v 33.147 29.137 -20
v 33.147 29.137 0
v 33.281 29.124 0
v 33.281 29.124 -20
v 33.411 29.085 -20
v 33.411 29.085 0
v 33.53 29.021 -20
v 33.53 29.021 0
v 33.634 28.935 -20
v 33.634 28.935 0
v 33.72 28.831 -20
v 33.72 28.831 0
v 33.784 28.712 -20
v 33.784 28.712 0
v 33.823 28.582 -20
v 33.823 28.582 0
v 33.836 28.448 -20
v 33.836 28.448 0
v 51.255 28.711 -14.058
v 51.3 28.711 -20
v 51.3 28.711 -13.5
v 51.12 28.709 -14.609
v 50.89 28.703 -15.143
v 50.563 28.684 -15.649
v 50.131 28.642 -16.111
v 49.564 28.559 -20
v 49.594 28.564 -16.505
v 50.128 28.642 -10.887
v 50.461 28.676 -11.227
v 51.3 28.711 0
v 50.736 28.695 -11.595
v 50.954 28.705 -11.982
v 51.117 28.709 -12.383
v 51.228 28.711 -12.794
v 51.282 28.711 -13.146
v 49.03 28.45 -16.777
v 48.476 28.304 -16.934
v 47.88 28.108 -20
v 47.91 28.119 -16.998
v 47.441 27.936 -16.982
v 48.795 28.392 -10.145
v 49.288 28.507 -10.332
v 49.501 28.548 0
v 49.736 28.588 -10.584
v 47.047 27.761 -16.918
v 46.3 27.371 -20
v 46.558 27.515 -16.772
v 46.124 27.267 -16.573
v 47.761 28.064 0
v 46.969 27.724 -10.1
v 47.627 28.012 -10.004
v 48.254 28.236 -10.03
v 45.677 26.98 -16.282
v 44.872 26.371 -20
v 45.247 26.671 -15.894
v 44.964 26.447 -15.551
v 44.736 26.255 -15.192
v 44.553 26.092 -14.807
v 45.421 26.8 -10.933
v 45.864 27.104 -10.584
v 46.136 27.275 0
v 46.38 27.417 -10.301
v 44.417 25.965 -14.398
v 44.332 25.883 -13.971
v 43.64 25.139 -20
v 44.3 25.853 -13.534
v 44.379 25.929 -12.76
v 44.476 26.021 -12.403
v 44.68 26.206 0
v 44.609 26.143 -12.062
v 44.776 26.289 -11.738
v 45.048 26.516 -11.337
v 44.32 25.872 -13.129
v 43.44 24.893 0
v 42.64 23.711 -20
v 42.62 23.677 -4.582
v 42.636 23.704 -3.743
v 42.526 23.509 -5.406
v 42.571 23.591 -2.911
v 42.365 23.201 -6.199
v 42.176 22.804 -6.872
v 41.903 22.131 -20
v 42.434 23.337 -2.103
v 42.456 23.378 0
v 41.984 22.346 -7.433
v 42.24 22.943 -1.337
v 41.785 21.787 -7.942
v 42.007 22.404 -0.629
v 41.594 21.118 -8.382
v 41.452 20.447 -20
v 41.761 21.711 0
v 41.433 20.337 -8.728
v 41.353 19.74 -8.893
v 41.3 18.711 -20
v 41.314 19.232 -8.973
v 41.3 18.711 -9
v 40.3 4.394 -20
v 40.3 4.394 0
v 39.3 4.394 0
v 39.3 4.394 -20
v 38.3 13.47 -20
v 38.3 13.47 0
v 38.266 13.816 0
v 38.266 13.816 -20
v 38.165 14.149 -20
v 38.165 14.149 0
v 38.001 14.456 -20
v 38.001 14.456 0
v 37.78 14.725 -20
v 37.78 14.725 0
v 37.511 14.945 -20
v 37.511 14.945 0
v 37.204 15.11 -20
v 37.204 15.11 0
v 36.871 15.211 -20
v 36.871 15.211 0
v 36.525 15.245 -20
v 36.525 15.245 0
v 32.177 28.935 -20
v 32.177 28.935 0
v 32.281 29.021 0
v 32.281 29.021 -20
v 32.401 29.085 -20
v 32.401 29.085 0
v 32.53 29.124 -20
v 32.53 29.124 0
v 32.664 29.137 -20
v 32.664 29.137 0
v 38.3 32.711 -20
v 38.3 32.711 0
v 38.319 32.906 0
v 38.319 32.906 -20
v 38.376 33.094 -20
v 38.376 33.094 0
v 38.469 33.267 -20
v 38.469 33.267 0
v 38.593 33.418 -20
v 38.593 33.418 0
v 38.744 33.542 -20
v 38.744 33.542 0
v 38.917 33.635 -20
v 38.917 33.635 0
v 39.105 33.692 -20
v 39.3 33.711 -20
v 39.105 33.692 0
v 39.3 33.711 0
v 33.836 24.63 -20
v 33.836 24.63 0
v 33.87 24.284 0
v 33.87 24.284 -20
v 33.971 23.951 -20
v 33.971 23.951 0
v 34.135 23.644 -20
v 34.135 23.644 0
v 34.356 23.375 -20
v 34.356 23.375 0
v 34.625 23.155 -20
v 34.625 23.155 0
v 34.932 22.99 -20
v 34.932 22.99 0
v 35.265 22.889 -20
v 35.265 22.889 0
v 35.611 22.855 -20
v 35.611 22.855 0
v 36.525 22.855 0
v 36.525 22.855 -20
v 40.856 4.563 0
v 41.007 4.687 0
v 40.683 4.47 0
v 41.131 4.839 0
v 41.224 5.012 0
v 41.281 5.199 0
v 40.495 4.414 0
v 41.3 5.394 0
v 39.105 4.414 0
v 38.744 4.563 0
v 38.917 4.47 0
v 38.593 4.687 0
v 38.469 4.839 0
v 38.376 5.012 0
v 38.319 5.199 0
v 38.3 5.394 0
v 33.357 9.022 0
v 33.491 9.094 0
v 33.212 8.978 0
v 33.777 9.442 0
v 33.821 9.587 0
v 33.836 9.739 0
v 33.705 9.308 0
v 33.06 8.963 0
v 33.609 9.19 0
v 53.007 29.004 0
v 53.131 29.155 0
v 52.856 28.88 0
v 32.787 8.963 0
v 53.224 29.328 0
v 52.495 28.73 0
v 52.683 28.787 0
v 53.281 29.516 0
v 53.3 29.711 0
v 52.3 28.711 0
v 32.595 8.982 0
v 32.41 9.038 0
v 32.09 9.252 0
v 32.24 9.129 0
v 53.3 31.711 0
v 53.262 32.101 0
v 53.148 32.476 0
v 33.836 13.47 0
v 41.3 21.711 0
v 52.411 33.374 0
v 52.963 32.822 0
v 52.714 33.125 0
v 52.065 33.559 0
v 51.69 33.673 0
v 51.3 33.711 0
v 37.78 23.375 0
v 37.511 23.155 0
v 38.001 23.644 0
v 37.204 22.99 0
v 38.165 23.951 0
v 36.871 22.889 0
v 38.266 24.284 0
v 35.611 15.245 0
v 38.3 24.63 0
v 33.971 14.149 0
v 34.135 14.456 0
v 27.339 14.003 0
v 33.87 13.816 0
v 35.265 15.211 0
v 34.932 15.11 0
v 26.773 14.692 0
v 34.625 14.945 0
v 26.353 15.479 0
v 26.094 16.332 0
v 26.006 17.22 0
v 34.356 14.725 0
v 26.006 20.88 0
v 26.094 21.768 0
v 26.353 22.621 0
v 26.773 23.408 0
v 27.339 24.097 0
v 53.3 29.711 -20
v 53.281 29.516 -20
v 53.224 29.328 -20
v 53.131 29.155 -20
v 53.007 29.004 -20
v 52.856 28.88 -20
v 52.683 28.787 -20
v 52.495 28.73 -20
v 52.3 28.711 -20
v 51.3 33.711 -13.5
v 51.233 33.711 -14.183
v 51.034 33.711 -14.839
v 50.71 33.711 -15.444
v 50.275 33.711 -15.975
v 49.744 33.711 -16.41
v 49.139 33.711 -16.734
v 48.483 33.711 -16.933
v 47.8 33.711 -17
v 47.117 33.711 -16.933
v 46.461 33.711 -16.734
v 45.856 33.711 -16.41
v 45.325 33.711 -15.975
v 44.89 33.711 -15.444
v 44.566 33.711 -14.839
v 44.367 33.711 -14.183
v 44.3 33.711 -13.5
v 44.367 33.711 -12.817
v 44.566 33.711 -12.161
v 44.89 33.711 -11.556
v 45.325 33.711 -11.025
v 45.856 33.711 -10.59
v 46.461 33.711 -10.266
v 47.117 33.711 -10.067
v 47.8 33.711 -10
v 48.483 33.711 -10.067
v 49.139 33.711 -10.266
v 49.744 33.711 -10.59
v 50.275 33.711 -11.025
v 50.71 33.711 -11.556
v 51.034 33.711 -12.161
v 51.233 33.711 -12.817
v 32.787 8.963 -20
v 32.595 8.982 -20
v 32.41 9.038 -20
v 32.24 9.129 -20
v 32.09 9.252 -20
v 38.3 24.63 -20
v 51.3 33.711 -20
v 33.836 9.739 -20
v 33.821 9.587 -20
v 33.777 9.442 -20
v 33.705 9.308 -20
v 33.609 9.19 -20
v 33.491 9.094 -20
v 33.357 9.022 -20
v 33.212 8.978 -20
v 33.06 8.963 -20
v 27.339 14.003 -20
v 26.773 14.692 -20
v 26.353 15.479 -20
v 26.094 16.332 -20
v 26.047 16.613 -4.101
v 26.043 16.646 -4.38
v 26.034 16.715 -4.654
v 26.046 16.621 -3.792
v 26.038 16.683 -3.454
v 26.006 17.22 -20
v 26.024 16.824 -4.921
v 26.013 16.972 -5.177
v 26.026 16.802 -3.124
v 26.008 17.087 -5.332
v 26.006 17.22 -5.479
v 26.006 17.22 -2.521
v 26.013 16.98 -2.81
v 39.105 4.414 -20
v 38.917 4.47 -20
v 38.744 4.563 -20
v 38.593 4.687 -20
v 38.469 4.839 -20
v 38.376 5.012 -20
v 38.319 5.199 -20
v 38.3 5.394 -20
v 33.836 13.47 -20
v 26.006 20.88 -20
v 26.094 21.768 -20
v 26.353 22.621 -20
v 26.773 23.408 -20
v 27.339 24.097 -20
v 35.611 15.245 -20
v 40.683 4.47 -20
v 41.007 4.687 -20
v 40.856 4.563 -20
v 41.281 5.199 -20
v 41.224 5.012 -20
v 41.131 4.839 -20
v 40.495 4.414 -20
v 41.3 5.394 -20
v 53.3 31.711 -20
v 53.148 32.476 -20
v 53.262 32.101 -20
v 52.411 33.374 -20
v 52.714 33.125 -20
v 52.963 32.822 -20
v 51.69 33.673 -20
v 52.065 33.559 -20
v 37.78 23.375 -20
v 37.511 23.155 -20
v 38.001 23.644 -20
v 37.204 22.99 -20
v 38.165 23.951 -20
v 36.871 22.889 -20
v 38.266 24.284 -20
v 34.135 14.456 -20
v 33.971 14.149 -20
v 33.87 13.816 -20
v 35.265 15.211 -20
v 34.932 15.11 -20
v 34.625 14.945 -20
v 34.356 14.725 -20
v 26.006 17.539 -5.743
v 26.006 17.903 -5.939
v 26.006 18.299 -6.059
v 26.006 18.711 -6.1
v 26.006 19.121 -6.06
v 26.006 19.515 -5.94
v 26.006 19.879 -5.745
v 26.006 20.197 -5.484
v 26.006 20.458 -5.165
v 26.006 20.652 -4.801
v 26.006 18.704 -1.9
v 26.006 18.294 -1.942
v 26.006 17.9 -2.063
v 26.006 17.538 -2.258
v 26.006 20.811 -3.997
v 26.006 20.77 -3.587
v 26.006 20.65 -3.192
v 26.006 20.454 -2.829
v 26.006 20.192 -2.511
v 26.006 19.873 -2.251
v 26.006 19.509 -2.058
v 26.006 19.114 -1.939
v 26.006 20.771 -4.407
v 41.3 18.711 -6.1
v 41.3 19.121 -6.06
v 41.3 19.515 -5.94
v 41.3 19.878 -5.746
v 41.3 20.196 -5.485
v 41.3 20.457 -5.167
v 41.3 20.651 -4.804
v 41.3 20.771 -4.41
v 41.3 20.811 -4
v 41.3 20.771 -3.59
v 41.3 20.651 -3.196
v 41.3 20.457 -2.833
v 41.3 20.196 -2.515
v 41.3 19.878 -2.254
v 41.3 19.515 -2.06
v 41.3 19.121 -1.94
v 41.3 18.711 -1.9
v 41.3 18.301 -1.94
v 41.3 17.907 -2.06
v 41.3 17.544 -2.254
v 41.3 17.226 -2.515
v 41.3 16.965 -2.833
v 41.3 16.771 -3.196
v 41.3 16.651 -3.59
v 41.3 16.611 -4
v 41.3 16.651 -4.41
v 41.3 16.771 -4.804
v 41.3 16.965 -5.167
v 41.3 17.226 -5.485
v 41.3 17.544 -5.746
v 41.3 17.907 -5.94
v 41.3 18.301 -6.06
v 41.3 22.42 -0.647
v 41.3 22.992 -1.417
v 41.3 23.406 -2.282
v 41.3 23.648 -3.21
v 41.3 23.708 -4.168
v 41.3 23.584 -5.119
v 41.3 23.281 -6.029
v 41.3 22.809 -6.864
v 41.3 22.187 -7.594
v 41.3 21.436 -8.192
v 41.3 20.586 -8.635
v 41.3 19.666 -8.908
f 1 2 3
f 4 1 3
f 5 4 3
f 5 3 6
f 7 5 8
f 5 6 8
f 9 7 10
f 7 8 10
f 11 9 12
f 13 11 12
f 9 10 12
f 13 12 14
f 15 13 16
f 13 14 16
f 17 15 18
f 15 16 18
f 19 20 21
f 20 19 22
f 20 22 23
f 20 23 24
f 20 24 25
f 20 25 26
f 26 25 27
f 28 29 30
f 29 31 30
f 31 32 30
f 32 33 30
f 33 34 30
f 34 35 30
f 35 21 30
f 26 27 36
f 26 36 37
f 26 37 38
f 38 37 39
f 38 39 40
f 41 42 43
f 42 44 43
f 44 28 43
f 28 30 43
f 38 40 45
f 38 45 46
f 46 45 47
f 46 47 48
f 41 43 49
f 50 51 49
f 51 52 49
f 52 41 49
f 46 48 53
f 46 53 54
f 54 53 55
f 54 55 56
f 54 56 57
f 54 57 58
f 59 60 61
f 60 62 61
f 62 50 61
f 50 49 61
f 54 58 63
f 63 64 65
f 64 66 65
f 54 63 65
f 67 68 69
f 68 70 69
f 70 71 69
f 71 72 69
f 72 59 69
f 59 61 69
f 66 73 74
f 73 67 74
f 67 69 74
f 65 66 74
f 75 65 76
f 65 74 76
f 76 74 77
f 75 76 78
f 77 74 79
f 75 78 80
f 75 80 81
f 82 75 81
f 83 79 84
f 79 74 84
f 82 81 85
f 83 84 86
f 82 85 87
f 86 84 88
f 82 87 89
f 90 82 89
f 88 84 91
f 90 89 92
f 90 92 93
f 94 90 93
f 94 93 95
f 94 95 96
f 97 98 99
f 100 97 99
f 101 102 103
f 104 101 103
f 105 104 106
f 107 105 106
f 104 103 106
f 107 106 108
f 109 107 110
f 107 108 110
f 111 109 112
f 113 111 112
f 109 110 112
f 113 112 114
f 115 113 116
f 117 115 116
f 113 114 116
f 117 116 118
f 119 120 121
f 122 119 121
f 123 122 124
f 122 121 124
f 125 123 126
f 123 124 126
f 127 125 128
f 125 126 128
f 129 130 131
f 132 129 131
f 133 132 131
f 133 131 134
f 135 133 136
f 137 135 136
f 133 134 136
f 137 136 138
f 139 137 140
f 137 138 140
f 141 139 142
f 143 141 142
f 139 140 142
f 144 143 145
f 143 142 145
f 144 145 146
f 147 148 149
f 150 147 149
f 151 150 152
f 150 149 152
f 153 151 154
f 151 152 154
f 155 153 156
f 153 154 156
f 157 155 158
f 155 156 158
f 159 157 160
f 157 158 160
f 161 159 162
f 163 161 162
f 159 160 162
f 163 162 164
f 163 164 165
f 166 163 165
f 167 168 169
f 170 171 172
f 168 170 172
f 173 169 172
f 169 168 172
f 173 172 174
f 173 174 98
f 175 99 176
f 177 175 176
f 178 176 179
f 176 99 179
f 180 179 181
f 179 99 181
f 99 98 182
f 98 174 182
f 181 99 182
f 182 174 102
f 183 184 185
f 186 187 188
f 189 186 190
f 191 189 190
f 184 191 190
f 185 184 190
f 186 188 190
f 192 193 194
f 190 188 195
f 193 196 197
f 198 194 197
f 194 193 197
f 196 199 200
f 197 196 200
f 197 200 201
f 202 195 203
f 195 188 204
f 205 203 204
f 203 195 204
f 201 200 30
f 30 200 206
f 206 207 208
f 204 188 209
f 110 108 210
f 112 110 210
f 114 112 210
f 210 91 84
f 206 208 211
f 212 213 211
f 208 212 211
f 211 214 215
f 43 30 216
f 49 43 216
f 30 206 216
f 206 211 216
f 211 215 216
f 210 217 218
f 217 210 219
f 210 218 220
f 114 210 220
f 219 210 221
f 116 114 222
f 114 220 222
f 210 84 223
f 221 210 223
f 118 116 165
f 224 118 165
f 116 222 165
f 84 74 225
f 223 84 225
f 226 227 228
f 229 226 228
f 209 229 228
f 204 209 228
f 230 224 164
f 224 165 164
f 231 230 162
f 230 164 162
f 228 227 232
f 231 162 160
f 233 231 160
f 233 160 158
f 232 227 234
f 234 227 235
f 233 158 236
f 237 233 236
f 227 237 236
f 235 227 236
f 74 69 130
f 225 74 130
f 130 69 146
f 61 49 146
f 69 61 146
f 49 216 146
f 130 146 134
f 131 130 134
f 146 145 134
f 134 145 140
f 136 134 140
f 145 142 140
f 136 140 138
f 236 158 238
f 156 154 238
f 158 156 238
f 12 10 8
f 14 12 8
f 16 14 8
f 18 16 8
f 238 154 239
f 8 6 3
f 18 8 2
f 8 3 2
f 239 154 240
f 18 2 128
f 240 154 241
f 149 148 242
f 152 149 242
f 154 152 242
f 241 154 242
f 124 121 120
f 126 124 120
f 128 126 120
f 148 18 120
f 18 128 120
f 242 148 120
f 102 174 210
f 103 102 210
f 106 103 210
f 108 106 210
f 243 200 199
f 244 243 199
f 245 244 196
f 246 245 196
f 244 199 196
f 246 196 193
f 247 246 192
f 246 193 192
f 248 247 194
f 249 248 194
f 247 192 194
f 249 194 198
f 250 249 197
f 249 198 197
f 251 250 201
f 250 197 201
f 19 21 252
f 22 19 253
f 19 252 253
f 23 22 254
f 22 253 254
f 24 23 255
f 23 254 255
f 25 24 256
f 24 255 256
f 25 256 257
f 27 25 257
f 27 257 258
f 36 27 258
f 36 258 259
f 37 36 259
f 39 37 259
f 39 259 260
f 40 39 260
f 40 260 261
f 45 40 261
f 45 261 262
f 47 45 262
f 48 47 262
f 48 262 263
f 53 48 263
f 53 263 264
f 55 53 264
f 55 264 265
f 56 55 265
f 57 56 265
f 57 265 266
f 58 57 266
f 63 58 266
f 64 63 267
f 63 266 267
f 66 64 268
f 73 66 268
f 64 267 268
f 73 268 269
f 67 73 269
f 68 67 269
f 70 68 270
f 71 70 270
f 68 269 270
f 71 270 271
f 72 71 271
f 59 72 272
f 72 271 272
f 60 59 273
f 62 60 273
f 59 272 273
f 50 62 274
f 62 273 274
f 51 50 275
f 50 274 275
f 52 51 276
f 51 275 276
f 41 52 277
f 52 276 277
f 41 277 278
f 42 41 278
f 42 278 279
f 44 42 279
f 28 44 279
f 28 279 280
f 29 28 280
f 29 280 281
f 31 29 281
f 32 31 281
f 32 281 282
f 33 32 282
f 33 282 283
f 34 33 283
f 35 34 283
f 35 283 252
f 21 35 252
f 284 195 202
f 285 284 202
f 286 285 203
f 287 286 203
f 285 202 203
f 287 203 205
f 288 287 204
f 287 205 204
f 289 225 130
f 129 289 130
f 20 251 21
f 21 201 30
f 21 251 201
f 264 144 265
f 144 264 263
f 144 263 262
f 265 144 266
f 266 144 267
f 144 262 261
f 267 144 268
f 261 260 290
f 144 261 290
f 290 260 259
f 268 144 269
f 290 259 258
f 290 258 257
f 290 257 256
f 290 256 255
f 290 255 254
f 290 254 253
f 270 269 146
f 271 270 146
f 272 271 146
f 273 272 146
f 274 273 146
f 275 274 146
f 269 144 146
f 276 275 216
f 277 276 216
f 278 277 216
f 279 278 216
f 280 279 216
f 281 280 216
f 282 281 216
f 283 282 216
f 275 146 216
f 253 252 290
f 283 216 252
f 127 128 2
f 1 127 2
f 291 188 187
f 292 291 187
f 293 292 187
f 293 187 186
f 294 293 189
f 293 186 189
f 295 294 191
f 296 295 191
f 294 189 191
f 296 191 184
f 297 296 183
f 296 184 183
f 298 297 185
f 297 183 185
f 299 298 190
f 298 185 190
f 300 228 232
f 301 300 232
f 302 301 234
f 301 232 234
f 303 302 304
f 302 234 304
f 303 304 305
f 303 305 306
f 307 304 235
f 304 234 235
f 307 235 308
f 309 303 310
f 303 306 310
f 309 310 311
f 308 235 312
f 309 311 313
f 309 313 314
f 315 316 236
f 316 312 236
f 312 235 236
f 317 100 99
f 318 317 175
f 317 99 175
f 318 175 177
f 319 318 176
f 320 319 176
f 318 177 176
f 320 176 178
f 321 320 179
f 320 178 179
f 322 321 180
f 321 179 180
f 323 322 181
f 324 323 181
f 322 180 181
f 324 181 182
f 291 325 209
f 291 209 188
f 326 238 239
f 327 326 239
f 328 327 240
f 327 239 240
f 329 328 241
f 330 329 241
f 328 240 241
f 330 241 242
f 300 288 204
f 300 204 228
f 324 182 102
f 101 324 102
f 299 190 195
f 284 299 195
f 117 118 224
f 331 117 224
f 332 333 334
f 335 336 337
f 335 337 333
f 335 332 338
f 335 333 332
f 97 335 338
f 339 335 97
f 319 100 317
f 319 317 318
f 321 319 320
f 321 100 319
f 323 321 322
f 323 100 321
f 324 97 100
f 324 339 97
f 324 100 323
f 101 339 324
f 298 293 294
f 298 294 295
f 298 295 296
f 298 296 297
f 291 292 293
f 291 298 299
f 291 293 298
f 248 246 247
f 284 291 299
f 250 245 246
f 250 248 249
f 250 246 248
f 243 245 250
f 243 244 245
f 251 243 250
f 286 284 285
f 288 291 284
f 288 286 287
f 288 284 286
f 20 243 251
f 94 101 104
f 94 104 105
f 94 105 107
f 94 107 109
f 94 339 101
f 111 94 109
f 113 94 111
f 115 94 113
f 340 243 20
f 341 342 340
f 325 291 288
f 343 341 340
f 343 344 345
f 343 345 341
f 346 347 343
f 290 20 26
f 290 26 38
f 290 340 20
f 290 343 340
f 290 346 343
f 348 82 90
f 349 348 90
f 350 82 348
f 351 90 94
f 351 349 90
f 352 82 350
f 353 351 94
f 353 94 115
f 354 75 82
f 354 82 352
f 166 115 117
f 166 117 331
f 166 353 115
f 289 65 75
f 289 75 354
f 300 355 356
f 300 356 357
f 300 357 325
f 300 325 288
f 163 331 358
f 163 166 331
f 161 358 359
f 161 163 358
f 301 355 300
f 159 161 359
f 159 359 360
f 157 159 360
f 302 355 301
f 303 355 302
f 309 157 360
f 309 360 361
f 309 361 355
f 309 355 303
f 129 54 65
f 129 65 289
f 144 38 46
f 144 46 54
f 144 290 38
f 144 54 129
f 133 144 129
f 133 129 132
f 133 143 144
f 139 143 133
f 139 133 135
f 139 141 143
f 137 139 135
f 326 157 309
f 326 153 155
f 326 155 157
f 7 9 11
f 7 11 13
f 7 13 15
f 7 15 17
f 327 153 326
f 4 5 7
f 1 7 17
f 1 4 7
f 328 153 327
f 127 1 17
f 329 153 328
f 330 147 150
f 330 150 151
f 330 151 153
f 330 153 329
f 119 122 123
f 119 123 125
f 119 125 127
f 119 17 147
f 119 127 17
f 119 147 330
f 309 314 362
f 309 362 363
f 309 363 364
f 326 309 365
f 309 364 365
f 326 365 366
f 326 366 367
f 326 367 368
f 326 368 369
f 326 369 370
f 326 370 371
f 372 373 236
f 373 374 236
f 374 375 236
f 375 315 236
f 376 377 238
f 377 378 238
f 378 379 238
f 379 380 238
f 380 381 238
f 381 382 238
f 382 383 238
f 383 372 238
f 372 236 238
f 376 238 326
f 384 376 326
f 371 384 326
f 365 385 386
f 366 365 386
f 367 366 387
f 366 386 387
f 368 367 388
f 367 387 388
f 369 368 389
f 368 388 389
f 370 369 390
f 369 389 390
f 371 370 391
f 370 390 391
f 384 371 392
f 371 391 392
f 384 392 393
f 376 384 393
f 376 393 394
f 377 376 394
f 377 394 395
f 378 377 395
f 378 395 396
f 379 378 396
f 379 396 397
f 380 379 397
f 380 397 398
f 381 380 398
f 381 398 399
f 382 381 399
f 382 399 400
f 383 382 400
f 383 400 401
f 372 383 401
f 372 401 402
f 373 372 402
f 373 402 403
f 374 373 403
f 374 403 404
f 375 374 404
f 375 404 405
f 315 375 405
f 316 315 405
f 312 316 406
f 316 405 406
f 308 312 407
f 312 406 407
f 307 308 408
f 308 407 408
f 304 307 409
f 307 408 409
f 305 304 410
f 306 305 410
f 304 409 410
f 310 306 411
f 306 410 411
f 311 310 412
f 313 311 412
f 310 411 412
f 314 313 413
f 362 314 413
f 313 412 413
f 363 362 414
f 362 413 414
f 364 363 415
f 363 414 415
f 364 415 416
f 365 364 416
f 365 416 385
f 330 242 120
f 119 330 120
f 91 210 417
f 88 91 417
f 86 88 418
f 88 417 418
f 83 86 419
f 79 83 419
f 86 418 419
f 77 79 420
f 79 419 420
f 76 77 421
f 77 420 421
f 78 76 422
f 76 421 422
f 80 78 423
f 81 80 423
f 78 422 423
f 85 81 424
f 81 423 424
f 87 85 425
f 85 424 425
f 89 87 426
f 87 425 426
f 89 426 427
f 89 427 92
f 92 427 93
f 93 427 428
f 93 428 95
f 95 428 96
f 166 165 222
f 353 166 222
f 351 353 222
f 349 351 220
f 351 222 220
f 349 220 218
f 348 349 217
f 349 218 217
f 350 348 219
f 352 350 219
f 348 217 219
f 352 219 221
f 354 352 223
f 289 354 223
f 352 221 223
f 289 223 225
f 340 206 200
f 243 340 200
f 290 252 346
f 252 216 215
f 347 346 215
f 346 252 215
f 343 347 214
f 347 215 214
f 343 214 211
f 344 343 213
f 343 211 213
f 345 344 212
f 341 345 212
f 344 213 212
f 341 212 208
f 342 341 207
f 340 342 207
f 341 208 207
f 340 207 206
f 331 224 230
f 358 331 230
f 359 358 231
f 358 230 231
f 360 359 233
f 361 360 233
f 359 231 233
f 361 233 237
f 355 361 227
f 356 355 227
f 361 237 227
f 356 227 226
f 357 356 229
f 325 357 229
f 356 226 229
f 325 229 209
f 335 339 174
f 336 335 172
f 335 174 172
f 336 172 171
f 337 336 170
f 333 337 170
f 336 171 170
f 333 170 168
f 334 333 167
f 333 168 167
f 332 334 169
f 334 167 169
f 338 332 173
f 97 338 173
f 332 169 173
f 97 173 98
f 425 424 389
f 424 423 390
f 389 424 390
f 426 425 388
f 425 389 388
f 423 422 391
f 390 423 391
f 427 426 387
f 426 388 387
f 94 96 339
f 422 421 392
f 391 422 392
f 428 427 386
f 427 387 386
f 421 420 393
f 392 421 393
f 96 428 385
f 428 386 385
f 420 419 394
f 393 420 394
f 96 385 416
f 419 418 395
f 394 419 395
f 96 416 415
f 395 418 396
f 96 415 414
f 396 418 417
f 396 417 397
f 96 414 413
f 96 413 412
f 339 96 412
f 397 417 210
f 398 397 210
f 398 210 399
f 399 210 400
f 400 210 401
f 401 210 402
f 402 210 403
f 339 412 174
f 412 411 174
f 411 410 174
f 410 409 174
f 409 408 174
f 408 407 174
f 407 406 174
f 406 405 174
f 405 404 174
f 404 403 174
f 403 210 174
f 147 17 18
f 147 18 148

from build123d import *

# Parameters (mm, degrees)
BOSS_EXTRUDE1_DEPTH = 20
SKETCH2_R           = 3.5
CUT_EXTRUDE1_DEPTH  = 65.034014806
SKETCH3_R           = 2.1
CUT_EXTRUDE2_DEPTH  = 43.075221337
SKETCH4_R           = 5
CUT_EXTRUDE3_DEPTH  = 20


with BuildPart() as part:
    # Sketch1 → Boss-Extrude1 (new body)
    with BuildSketch(Plane.XY):
        with BuildLine():
            Line((38.3, 9.881410941), (38.3, 10.745623604))
            Line((38.3, 10.745623604), (38.3, 13.469803951))
            ThreePointArc((38.3, 13.469803951), (37.780173115, 14.724777066), (36.5252, 15.244603951))
            Line((36.5252, 15.244603951), (35.610800366, 15.244603951))
            ThreePointArc((35.610800366, 15.244603951), (34.355826992, 14.724776959), (33.836, 13.469803585))
            Line((33.836, 13.469803585), (33.836, 9.738724213))
            ThreePointArc((33.836, 9.738724213), (33.608795638, 9.190204362), (33.060275787, 8.963))
            Line((33.060275787, 8.963), (32.786933649, 8.963))
            ThreePointArc((32.786933649, 8.963), (32.409953896, 9.037986056), (32.090366071, 9.25152824))
            Line((32.090366071, 9.25152824), (27.33900161, 14.002904388))
            ThreePointArc((27.33900161, 14.002904388), (26.352731832, 15.478964368), (26.0064, 17.220094864))
            Line((26.0064, 17.220094864), (26.0064, 20.879905136))
            ThreePointArc((26.0064, 20.879905136), (26.352731832, 22.621035632), (27.33900161, 24.097095612))
            Line((27.33900161, 24.097095612), (32.177090071, 28.935195973))
            ThreePointArc((32.177090071, 28.935195973), (32.400617966, 29.084552836), (32.664287242, 29.137))
            Line((32.664287242, 29.137), (33.147, 29.137))
            ThreePointArc((33.147, 29.137), (33.634196572, 28.935196572), (33.836, 28.448))
            Line((33.836, 28.448), (33.836, 24.630196049))
            ThreePointArc((33.836, 24.630196049), (34.355826885, 23.375222934), (35.6108, 22.855396049))
            Line((35.6108, 22.855396049), (36.525200183, 22.855396049))
            ThreePointArc((36.525200183, 22.855396049), (37.780173169, 23.37522288), (38.3, 24.630195866))
            Line((38.3, 24.630195866), (38.3, 27.353495632))
            Line((38.3, 27.353495632), (38.3, 28.215588568))
            Line((38.3, 28.215588568), (38.3, 32.710978016))
            ThreePointArc((38.3, 32.710978016), (38.592893219, 33.418084798), (39.3, 33.710978016))
            Line((39.3, 33.710978016), (41.3, 33.710978016))
            Line((41.3, 33.710978016), (51.3, 33.710978016))
            ThreePointArc((51.3, 33.710978016), (52.714213562, 33.125191579), (53.3, 31.710978016))
            Line((53.3, 31.710978016), (53.3, 29.710978016))
            ThreePointArc((53.3, 29.710978016), (53.007106781, 29.003871235), (52.3, 28.710978016))
            Line((52.3, 28.710978016), (51.3, 28.710978016))
            ThreePointArc((51.3, 28.710978016), (44.228932188, 25.782045828), (41.3, 18.710978016))
            Line((41.3, 18.710978016), (41.3, 5.394343623))
            ThreePointArc((41.3, 5.394343623), (41.007106781, 4.687236842), (40.3, 4.394343623))
            Line((40.3, 4.394343623), (39.3, 4.394343623))
            ThreePointArc((39.3, 4.394343623), (38.592893219, 4.687236842), (38.3, 5.394343623))
            Line((38.3, 5.394343623), (38.3, 9.881410941))
        make_face()
    extrude(amount=-BOSS_EXTRUDE1_DEPTH)

    # Sketch2 → Cut-Extrude1 (cut, through all)
    with BuildSketch(Plane(origin=(0, 33.710978016, 0), x_dir=(1, 0, 0), z_dir=(0, 1, 0))):
        with Locations((47.8, 13.5)):
            Circle(SKETCH2_R)
    extrude(amount=-CUT_EXTRUDE1_DEPTH, mode=Mode.SUBTRACT)

    # Sketch3 → Cut-Extrude2 (cut, through all)
    with BuildSketch(Plane(origin=(41.3, 0, 0), x_dir=(0, 0, -1), z_dir=(1, 0, 0))):
        with Locations((4, 18.710978016)):
            Circle(SKETCH3_R)
    extrude(amount=-CUT_EXTRUDE2_DEPTH, mode=Mode.SUBTRACT)

    # Sketch4 → Cut-Extrude3 (cut)
    with BuildSketch(Plane.ZY.offset(-41.3)):
        with Locations((-4, 18.710978016)):
            Circle(SKETCH4_R)
    extrude(amount=-CUT_EXTRUDE3_DEPTH, mode=Mode.SUBTRACT)


solid = part.part
